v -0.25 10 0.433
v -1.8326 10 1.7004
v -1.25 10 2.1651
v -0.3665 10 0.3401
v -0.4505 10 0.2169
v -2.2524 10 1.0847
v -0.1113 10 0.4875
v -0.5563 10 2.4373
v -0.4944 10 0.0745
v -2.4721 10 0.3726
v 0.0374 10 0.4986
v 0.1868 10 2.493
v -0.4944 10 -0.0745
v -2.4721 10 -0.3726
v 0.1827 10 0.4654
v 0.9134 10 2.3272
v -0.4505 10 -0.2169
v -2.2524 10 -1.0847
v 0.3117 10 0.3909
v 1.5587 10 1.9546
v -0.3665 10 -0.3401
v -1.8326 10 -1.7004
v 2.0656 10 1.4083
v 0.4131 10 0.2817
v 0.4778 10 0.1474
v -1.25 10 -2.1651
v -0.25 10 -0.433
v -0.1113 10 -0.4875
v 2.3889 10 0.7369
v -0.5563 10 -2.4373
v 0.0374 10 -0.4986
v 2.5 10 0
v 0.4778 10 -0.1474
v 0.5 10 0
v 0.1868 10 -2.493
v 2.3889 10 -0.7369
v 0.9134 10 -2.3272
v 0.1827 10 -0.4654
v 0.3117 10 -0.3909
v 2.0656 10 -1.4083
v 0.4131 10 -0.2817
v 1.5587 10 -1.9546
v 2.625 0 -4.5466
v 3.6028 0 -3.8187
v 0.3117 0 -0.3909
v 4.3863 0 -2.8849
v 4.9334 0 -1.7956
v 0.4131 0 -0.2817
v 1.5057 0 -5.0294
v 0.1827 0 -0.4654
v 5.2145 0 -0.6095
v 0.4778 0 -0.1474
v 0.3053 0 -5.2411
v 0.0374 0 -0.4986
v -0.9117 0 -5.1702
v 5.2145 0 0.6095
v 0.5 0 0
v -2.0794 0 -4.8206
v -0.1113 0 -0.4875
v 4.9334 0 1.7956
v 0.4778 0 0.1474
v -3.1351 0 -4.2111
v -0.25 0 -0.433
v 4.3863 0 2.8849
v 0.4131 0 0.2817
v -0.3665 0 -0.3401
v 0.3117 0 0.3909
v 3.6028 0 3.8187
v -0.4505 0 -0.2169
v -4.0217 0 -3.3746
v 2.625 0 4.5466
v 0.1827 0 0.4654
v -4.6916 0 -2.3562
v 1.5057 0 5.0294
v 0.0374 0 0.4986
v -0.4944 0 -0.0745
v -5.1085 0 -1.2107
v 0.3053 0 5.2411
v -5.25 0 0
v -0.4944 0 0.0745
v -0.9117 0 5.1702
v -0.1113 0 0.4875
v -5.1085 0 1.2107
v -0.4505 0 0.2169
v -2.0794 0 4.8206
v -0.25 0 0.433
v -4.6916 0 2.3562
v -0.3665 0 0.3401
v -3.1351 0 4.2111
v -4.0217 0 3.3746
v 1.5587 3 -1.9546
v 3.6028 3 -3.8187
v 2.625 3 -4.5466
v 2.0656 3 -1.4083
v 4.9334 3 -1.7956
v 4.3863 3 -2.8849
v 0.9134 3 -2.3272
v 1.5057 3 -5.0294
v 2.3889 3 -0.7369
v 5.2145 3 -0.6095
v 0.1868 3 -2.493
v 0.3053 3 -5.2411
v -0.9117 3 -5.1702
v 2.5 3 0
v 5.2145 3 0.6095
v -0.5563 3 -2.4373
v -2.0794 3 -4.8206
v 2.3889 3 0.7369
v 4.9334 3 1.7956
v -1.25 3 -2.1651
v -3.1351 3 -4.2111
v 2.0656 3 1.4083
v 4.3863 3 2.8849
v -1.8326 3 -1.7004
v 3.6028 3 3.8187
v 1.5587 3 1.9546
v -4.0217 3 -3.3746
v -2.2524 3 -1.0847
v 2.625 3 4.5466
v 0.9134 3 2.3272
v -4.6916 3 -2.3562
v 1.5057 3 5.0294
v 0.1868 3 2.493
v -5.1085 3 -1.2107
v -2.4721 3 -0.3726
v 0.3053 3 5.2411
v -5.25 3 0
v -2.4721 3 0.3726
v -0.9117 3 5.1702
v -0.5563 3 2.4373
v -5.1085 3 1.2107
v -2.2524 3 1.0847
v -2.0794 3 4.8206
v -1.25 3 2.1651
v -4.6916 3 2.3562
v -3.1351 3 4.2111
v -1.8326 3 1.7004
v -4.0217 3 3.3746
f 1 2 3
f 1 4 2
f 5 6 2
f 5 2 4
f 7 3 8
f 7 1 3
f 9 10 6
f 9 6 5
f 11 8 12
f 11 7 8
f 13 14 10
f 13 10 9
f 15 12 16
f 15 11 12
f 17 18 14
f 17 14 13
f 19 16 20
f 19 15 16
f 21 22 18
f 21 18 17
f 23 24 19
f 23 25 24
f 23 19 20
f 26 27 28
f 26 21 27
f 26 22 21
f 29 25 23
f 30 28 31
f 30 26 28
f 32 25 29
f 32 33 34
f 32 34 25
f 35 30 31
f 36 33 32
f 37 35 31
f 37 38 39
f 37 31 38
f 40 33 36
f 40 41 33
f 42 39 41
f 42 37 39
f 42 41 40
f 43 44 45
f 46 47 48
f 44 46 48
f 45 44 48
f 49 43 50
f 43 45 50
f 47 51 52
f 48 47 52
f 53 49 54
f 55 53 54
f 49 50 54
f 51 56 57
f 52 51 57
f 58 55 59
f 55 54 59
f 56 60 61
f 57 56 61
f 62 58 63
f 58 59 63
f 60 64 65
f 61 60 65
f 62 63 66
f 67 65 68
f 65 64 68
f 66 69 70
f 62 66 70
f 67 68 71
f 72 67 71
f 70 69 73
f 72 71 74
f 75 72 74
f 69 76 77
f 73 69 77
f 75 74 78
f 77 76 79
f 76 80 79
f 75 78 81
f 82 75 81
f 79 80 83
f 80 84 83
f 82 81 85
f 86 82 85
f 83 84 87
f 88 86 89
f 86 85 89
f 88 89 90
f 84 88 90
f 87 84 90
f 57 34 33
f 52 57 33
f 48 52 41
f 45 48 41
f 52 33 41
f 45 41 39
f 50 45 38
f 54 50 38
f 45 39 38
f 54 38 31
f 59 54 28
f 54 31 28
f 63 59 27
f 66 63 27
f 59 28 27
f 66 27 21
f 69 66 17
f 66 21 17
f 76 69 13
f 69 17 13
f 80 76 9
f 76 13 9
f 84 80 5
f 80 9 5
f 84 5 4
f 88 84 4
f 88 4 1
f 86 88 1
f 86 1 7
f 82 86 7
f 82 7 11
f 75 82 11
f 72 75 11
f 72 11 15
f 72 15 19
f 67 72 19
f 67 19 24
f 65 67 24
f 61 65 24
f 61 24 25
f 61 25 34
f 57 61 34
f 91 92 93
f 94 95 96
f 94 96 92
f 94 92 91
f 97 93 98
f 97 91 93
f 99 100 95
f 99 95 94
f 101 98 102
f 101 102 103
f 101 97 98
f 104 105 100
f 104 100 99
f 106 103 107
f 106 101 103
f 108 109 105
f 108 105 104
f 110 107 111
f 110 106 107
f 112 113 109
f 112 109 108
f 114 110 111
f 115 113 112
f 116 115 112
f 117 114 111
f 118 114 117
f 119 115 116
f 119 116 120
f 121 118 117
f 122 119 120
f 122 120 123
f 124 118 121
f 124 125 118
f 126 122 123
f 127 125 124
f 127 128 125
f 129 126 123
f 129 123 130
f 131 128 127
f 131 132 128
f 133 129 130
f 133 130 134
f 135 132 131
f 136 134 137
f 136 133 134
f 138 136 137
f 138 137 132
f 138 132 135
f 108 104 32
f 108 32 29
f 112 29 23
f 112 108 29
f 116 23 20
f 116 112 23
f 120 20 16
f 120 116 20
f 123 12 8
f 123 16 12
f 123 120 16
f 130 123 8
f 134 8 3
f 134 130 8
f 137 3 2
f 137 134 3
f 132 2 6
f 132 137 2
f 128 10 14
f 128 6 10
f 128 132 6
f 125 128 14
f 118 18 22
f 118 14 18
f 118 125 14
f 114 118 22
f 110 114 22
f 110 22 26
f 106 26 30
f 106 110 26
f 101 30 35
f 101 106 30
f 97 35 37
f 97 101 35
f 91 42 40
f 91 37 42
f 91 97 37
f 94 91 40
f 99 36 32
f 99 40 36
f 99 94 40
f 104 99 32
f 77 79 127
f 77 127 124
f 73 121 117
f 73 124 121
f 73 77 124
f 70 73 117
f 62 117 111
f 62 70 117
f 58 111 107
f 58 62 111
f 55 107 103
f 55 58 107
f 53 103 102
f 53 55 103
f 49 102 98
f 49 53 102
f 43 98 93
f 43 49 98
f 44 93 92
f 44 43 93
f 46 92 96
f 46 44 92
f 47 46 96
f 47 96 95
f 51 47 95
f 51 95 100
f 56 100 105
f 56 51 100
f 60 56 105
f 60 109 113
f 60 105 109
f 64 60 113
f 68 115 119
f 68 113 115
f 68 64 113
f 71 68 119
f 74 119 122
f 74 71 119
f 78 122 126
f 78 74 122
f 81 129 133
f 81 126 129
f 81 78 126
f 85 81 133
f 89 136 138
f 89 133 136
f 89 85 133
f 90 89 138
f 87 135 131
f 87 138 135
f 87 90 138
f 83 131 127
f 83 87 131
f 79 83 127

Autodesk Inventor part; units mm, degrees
ref_plane "YZ Plane" through (0, 0, 0) normal (1, 0, 0) x (0, 1, 0)
ref_plane "XZ Plane" through (0, 0, 0) normal (0, 1, 0) x (-1, 0, 0)
ref_plane "XY Plane" through (0, 0, 0) normal (0, 0, 1) x (1, 0, 0)
sketch "スケッチ1" plane through (0, 0, 0) normal (0, 1, 0) x (-1, 0, 0)
  circle A0 centre (0, 0) radius 5.25
  dimension "d0" = 10.5
extrude "押し出し1" add sketch "スケッチ1" along normal blind 3
sketch "スケッチ2" plane through (0, 3, 0) normal (0, 1, 0) x (1, 0, 0)
  circle A0 centre (0, 0) radius 2.5
  dimension "d3" = 5
extrude "押し出し2" add sketch "スケッチ2" along normal blind 7
sketch "スケッチ3" plane through (0, 10, 0) normal (0, 1, 0) x (1, 0, 0)
  circle A0 centre (0, 0) radius 2.5 projected
  circle A1 centre (0, 0) radius 0.5
  dimension "d6" = 1
extrude "押し出し3" cut sketch "スケッチ3" against normal through all contours A1
properties part number "gear_tamiya_m0.5_10T_21T"
